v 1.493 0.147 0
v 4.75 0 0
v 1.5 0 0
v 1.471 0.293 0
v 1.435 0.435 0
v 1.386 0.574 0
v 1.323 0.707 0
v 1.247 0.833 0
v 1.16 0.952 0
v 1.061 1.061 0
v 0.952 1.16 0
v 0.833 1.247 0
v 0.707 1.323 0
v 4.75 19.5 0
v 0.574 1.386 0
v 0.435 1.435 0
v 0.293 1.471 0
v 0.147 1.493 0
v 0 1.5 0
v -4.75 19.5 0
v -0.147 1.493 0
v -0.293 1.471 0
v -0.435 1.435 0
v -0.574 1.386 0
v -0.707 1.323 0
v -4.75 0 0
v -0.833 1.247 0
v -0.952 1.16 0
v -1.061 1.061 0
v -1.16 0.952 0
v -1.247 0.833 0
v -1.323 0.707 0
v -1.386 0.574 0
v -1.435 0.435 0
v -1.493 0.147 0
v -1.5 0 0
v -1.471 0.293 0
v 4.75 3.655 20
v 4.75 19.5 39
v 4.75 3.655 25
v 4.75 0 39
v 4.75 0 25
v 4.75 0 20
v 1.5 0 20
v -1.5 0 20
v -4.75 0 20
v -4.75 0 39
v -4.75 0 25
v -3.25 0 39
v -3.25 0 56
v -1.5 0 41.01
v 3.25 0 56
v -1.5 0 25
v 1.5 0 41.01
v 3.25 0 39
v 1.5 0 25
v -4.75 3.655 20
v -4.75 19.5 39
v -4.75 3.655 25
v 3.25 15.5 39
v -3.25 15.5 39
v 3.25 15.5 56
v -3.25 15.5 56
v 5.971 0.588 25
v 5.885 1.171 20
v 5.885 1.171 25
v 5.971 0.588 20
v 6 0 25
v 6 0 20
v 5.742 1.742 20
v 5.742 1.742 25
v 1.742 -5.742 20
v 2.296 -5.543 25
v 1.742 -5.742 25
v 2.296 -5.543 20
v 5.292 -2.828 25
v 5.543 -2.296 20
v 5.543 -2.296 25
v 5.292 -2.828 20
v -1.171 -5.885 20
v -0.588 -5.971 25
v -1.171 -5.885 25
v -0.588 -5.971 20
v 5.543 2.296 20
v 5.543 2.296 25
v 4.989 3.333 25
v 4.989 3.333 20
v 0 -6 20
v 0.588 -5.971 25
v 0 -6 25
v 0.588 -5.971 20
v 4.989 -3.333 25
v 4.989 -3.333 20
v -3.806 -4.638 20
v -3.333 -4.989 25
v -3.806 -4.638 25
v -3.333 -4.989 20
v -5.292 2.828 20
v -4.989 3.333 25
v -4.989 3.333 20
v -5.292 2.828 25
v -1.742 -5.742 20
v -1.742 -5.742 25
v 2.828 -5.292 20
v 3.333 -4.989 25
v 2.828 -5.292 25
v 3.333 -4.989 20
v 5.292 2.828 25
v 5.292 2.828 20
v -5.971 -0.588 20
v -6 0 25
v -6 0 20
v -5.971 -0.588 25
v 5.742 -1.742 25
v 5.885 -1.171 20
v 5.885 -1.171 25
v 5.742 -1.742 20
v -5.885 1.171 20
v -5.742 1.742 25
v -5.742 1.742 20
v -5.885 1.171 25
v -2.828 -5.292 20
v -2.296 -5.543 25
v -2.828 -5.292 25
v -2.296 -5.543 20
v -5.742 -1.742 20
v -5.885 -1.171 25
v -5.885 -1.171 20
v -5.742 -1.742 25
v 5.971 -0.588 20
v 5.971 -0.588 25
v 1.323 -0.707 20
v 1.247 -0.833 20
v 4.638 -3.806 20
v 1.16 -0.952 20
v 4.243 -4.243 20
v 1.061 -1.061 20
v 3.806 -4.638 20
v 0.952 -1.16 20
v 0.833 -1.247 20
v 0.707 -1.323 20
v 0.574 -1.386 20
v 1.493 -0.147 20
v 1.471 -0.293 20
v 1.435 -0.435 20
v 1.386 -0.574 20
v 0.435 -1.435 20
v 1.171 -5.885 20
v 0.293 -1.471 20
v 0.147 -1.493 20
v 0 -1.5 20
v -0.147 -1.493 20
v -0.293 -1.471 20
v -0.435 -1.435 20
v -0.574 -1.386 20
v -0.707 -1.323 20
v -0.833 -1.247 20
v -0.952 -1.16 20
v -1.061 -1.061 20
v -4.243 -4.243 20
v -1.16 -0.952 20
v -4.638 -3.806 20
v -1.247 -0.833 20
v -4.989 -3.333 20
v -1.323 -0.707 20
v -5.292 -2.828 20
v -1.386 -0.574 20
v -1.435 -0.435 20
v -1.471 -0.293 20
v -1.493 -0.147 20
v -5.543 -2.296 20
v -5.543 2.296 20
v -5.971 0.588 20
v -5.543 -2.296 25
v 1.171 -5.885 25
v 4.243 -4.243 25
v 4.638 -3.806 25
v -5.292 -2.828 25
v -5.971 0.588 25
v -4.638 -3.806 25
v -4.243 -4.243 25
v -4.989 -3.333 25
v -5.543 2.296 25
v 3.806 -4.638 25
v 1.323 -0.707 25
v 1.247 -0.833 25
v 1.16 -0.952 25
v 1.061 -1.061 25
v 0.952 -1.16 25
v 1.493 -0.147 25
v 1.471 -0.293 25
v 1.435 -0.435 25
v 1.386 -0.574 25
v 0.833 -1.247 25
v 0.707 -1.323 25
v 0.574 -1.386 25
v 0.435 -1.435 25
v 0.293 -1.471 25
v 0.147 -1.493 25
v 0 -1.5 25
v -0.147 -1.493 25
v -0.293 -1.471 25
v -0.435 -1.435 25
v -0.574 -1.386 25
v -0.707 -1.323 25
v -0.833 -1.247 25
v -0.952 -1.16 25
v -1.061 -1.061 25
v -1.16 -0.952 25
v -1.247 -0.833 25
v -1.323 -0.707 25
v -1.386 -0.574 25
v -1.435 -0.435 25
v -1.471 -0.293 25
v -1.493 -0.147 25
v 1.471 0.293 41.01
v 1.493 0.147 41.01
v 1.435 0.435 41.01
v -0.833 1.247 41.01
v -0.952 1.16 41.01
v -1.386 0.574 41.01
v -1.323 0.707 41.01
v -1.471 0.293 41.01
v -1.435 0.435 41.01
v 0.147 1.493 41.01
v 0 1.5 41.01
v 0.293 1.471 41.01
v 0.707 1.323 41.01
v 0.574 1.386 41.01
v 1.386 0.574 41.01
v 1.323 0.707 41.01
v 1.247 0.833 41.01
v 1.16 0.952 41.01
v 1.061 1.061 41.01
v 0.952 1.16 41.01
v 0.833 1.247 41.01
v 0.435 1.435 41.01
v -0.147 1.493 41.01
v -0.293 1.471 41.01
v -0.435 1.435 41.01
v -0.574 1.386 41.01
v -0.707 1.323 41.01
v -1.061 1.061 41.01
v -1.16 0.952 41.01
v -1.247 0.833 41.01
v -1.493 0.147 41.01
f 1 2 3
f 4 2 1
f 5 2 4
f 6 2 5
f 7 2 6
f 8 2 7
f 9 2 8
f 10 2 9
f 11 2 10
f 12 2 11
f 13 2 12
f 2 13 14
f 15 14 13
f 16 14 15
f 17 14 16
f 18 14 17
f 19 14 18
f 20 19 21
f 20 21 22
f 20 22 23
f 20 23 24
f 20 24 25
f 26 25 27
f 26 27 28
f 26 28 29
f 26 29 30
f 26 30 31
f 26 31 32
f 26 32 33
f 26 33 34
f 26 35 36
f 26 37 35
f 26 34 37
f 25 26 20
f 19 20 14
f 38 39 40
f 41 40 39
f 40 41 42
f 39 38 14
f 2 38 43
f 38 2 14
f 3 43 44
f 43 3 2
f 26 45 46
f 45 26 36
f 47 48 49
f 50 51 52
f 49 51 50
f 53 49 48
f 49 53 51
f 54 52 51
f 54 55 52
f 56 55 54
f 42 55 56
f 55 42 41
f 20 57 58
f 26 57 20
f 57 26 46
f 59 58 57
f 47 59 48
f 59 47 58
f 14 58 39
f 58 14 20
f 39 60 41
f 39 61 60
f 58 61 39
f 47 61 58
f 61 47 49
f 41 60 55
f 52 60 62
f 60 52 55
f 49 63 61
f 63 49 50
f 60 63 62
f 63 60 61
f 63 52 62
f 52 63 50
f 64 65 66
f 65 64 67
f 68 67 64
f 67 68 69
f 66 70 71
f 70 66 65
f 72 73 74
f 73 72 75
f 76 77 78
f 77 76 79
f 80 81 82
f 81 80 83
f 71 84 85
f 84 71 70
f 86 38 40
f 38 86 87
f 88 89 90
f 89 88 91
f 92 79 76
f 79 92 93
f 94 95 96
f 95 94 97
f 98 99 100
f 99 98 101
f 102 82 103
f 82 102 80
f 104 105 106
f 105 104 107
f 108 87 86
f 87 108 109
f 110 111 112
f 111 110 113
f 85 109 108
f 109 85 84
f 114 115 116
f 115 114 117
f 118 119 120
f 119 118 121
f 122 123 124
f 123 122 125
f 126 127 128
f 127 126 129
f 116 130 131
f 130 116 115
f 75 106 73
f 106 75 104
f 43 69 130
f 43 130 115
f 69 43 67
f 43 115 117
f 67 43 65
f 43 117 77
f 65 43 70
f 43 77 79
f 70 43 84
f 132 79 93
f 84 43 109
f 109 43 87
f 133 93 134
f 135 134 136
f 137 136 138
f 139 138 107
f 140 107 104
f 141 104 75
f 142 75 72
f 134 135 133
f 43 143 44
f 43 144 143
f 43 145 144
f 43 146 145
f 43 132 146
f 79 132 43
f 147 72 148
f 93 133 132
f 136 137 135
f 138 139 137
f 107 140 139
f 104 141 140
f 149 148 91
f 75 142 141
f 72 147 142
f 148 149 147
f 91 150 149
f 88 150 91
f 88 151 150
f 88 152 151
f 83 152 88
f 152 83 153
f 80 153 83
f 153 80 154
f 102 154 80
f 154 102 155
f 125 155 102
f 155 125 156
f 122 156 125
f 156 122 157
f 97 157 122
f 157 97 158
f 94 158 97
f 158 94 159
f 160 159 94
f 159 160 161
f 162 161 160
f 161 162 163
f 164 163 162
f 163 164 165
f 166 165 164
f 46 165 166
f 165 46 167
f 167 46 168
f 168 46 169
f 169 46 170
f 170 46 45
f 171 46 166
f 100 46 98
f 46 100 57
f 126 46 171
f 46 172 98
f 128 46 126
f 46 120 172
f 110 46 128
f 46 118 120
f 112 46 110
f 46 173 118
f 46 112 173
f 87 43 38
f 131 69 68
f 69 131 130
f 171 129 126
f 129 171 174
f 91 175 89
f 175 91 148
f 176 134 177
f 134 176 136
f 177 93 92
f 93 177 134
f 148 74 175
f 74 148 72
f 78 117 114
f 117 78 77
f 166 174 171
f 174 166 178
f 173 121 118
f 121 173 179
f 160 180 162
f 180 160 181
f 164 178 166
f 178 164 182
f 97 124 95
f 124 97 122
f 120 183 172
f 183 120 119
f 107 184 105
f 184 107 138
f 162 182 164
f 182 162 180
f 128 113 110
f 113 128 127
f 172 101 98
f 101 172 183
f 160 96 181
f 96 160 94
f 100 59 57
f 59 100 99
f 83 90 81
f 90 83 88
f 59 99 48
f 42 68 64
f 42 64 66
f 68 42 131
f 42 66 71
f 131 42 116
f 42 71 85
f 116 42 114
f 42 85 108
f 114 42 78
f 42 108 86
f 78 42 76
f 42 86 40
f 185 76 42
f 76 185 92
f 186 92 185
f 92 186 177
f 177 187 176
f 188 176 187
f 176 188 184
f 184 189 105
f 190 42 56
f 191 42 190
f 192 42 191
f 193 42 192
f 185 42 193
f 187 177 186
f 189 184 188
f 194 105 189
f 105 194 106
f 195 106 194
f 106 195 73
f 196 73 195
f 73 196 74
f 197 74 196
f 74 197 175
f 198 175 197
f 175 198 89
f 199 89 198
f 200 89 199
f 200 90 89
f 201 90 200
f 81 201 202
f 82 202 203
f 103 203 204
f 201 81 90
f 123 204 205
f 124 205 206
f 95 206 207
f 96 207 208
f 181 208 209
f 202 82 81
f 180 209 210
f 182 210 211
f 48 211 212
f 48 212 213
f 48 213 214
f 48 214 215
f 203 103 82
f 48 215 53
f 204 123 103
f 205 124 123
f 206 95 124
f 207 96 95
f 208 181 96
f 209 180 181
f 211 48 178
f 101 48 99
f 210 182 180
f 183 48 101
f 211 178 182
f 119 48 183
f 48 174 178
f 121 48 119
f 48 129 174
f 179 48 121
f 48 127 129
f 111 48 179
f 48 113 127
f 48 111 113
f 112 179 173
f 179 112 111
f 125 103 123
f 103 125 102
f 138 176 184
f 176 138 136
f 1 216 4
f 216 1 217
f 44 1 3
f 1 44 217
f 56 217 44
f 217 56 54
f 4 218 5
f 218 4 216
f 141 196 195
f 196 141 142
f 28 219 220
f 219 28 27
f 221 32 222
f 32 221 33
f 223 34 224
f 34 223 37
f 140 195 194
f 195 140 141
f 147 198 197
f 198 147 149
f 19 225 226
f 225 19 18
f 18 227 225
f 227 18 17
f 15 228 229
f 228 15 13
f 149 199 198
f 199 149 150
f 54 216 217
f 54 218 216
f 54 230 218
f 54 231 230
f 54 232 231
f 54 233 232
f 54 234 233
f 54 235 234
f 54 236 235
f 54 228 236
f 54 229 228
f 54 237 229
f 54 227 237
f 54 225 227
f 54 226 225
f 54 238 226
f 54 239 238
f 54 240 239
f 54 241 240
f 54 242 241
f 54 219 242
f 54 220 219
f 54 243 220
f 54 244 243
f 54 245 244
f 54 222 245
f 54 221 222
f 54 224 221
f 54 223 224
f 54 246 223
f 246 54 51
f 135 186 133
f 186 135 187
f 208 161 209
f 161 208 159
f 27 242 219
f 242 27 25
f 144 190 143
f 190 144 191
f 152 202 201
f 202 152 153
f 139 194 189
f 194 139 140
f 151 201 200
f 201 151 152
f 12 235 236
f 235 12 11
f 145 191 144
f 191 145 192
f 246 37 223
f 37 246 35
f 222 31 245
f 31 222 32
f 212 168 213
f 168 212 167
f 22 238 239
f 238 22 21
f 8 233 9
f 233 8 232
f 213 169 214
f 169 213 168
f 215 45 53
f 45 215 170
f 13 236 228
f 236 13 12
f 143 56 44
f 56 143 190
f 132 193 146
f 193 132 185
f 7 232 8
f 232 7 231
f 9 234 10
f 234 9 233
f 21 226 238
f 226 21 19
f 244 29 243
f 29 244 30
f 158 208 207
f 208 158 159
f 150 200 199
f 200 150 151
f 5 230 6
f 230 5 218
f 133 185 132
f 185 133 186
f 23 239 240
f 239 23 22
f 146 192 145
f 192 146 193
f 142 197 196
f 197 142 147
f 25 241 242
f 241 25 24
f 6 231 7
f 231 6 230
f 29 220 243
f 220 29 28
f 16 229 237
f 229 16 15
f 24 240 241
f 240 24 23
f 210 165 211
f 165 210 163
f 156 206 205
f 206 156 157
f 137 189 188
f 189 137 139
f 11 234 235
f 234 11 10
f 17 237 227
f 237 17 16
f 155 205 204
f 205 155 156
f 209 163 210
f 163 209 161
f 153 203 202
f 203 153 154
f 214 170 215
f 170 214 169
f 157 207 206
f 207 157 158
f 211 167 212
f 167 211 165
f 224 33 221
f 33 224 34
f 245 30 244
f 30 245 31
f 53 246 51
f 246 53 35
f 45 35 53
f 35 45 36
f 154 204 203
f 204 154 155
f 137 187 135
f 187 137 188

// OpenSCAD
// Hose-barb reducer: 8 mm tubing -> 5 mm tubing
// Print orientation: standing upright along +Z

$fn = 64;

// ---- Dimensions (mm) ----
tube8_id     = 8;    // 8 mm tubing inner diameter
tube8_od     = 9.5;  // 8 mm tubing outer diameter
tube8_len    = 20;   // 8 mm tubing section length (z = 0 to 20)

tube5_id     = 5;    // 5 mm tubing inner diameter
tube5_od     = 6.5;  // 5 mm tubing outer diameter
tube5_len    = 16;   // 5 mm tubing section length (z = 25 to 41)

bore         = 3;    // through-bore diameter

collar_od    = 12;   // collar outer diameter (z = 20 to 25)
collar_len   = 5;    // collar length

overlap      = 0.5;  // overlap between stacked barbs
eps          = 0.01; // cutting overshoot

// ---- Model ----
difference() {
    union() {
        // 8 mm barbs
        for (i = [0 : 1])
            translate([0, 0, i * (tube8_len - overlap)])
                linear_extrude(height = tube8_len - overlap)
                    polygon([
                        [-tube8_od / 2, 0],
                        [tube8_od / 2, 0],
                        [tube8_od / 2, tube8_len - overlap],
                        [-tube8_od / 2, tube8_len - overlap]
                    ]);

        // Collar
        translate([0, 0, tube8_len])
            cylinder(d = collar_od, h = collar_len);

        // 5 mm barbs
        for (i = [0 : 1])
            translate([0, 0, tube8_len + collar_len + i * (tube5_len - overlap)])
                linear_extrude(height = tube5_len - overlap)
                    polygon([
                        [-tube5_od / 2, 0],
                        [tube5_od / 2, 0],
                        [tube5_od / 2, tube5_len - overlap],
                        [-tube5_od / 2, tube5_len - overlap]
                    ]);
    }

    // Through-bore
    translate([0, 0, -eps])
        cylinder(d = bore, h = tube8_len + collar_len + tube5_len + 2 * eps);
}
